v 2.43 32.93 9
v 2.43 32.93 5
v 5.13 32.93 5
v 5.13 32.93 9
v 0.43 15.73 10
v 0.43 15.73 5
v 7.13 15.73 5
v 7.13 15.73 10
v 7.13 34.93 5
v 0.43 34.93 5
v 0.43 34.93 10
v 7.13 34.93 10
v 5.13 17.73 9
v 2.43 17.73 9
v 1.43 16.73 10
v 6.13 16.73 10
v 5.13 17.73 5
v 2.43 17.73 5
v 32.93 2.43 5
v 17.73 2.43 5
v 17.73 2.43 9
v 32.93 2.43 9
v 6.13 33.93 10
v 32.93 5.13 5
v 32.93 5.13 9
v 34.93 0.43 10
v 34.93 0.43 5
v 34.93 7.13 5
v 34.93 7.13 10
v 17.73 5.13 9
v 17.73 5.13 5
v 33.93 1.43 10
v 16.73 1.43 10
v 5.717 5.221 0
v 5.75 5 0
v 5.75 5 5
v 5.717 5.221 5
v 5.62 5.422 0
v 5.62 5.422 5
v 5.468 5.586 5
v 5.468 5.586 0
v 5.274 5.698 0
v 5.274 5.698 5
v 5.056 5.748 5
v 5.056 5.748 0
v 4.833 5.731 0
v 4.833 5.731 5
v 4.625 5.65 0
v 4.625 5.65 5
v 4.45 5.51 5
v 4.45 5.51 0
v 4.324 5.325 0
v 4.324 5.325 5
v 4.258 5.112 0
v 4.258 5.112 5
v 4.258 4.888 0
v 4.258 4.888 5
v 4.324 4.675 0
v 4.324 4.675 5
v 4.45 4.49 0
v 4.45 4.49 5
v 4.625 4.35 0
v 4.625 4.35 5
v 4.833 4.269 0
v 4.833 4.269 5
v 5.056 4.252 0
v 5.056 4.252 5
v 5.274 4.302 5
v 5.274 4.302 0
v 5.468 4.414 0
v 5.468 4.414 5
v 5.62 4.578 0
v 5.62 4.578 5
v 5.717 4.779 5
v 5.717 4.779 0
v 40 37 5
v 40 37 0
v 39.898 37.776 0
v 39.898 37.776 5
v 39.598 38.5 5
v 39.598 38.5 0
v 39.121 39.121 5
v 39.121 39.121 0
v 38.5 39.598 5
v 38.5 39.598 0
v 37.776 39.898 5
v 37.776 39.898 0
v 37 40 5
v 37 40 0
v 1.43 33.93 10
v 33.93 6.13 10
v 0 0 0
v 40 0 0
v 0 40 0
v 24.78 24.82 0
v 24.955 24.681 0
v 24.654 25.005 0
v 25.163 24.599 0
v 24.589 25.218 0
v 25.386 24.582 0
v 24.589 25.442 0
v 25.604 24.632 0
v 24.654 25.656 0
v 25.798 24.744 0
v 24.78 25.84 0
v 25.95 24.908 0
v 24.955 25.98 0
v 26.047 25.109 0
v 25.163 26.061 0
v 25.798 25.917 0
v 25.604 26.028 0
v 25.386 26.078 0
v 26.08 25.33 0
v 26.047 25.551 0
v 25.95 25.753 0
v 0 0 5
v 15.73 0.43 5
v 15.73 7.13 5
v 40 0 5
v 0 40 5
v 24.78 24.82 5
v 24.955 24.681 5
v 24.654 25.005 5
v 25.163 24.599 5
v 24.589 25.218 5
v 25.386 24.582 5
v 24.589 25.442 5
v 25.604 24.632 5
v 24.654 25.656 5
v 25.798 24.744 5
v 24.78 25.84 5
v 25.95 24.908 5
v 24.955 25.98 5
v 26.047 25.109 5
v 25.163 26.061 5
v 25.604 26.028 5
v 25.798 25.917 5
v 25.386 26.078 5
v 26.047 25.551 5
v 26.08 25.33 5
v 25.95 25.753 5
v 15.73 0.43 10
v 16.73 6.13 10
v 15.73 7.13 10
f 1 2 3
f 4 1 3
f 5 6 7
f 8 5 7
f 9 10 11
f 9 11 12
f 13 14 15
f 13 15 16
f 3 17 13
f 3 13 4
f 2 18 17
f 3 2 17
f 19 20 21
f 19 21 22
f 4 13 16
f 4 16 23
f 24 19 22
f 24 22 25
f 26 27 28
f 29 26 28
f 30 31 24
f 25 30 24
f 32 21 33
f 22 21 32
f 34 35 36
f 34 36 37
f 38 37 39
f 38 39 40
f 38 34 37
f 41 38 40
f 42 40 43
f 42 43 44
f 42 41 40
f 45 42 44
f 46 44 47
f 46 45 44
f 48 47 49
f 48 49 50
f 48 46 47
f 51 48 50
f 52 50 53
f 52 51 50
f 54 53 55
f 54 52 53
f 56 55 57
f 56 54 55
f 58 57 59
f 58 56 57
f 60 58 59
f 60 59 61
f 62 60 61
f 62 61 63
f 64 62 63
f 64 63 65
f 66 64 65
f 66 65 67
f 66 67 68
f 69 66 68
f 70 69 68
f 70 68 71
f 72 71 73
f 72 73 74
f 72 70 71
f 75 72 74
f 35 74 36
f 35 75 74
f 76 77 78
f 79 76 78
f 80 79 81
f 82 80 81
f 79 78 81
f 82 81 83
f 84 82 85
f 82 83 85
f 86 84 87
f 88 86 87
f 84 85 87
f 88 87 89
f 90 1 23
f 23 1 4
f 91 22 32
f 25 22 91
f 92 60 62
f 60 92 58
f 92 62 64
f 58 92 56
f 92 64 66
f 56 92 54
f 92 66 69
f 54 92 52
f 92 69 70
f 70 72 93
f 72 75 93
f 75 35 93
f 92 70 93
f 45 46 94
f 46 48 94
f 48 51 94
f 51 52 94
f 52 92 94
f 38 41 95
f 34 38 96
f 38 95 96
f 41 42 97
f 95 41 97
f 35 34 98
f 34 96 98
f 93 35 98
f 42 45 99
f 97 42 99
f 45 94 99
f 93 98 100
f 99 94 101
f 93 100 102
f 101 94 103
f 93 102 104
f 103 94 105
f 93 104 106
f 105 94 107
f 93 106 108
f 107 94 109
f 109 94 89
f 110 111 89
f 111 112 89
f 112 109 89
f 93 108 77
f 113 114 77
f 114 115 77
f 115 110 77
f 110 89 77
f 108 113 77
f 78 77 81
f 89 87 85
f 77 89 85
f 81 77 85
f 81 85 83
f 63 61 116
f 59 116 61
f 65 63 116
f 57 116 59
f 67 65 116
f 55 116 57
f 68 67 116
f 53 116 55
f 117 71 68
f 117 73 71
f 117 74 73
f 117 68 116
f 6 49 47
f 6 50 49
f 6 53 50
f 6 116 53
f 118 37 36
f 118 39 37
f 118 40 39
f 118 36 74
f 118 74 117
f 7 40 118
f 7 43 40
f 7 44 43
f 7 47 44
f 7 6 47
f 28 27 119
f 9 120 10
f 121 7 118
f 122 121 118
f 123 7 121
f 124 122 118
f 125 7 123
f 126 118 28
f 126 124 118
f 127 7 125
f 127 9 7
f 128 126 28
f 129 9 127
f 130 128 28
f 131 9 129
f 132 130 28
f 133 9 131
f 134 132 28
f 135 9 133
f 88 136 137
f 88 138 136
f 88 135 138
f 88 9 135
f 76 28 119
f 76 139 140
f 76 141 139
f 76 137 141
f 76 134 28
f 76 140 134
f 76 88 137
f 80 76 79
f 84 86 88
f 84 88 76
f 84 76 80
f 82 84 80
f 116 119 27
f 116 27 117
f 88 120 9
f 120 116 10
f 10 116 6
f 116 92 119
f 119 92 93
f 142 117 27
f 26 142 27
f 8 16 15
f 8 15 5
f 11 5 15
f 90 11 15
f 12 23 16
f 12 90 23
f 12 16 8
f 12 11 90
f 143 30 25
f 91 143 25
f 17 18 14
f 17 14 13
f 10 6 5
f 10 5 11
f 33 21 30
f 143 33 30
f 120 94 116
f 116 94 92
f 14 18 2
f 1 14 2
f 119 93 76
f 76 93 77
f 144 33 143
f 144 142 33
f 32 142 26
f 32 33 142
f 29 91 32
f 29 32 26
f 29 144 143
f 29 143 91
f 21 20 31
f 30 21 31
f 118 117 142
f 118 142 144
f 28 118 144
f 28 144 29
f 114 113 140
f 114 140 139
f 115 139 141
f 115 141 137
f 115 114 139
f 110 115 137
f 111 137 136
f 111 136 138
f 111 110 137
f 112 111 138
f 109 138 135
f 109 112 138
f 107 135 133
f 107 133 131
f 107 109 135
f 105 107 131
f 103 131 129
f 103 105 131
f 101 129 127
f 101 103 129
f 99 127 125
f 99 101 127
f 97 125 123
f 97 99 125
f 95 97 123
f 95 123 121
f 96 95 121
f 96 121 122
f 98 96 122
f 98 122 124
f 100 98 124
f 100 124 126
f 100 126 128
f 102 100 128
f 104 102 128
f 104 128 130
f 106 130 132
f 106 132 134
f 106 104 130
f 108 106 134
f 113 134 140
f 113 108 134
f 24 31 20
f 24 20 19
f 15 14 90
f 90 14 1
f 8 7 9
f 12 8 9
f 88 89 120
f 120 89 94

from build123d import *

# Parameters (mm, degrees)
SKETCH_R      = 0.75
PAD_DEPTH     = 5
SKETCH001_W   = 6.7
SKETCH001_H   = 19.2
SKETCH001_W_2 = 2.7
SKETCH001_H_2 = 15.2
SKETCH001_W_3 = 19.2
SKETCH001_H_3 = 6.7
SKETCH001_W_4 = 15.2
SKETCH001_H_4 = 2.7
PAD001_DEPTH  = 5
CHAMFER_SIZE  = 1


with BuildPart() as part:
    # Sketch → Pad (new body)
    with BuildSketch(Plane.XY):
        with BuildLine():
            Line((0, 0), (40, 0))
            Line((40, 0), (40, 37))
            ThreePointArc((40, 37), (39.12132, 39.12132), (37, 40))
            Line((37, 40), (0, 40))
            Line((0, 40), (0, 0))
        make_face()
        with Locations((5, 5)):
            Circle(SKETCH_R, mode=Mode.SUBTRACT)
        with Locations((25.33016, 25.33016)):
            Circle(SKETCH_R, mode=Mode.SUBTRACT)
    extrude(amount=PAD_DEPTH)

    # Sketch001 (on Face9 of Pad) → Pad001 (join)
    with BuildSketch(Plane.XY.offset(5)):
        with Locations((3.78016, 25.33016)):
            Rectangle(SKETCH001_W, SKETCH001_H)
        with Locations((3.78016, 25.33016)):
            Rectangle(SKETCH001_W_2, SKETCH001_H_2, mode=Mode.SUBTRACT)
        with Locations((25.33016, 3.78016)):
            Rectangle(SKETCH001_W_3, SKETCH001_H_3)
        with Locations((25.33016, 3.78016)):
            Rectangle(SKETCH001_W_4, SKETCH001_H_4, mode=Mode.SUBTRACT)
    extrude(amount=PAD001_DEPTH)

    # Chamfer
    chamfer_edges = [part.edges().sort_by_distance(p)[0] for p in [
        (25.33016, 2.43016, 10),
        (17.73016, 3.78016, 10),
        (25.33016, 5.13016, 10),
        (32.93016, 3.78016, 10),
        (5.13016, 25.33016, 10),
        (3.78016, 17.73016, 10),
        (2.43016, 25.33016, 10),
        (3.78016, 32.93016, 10),
    ]]
    chamfer(chamfer_edges, length=CHAMFER_SIZE)


solid = part.part
